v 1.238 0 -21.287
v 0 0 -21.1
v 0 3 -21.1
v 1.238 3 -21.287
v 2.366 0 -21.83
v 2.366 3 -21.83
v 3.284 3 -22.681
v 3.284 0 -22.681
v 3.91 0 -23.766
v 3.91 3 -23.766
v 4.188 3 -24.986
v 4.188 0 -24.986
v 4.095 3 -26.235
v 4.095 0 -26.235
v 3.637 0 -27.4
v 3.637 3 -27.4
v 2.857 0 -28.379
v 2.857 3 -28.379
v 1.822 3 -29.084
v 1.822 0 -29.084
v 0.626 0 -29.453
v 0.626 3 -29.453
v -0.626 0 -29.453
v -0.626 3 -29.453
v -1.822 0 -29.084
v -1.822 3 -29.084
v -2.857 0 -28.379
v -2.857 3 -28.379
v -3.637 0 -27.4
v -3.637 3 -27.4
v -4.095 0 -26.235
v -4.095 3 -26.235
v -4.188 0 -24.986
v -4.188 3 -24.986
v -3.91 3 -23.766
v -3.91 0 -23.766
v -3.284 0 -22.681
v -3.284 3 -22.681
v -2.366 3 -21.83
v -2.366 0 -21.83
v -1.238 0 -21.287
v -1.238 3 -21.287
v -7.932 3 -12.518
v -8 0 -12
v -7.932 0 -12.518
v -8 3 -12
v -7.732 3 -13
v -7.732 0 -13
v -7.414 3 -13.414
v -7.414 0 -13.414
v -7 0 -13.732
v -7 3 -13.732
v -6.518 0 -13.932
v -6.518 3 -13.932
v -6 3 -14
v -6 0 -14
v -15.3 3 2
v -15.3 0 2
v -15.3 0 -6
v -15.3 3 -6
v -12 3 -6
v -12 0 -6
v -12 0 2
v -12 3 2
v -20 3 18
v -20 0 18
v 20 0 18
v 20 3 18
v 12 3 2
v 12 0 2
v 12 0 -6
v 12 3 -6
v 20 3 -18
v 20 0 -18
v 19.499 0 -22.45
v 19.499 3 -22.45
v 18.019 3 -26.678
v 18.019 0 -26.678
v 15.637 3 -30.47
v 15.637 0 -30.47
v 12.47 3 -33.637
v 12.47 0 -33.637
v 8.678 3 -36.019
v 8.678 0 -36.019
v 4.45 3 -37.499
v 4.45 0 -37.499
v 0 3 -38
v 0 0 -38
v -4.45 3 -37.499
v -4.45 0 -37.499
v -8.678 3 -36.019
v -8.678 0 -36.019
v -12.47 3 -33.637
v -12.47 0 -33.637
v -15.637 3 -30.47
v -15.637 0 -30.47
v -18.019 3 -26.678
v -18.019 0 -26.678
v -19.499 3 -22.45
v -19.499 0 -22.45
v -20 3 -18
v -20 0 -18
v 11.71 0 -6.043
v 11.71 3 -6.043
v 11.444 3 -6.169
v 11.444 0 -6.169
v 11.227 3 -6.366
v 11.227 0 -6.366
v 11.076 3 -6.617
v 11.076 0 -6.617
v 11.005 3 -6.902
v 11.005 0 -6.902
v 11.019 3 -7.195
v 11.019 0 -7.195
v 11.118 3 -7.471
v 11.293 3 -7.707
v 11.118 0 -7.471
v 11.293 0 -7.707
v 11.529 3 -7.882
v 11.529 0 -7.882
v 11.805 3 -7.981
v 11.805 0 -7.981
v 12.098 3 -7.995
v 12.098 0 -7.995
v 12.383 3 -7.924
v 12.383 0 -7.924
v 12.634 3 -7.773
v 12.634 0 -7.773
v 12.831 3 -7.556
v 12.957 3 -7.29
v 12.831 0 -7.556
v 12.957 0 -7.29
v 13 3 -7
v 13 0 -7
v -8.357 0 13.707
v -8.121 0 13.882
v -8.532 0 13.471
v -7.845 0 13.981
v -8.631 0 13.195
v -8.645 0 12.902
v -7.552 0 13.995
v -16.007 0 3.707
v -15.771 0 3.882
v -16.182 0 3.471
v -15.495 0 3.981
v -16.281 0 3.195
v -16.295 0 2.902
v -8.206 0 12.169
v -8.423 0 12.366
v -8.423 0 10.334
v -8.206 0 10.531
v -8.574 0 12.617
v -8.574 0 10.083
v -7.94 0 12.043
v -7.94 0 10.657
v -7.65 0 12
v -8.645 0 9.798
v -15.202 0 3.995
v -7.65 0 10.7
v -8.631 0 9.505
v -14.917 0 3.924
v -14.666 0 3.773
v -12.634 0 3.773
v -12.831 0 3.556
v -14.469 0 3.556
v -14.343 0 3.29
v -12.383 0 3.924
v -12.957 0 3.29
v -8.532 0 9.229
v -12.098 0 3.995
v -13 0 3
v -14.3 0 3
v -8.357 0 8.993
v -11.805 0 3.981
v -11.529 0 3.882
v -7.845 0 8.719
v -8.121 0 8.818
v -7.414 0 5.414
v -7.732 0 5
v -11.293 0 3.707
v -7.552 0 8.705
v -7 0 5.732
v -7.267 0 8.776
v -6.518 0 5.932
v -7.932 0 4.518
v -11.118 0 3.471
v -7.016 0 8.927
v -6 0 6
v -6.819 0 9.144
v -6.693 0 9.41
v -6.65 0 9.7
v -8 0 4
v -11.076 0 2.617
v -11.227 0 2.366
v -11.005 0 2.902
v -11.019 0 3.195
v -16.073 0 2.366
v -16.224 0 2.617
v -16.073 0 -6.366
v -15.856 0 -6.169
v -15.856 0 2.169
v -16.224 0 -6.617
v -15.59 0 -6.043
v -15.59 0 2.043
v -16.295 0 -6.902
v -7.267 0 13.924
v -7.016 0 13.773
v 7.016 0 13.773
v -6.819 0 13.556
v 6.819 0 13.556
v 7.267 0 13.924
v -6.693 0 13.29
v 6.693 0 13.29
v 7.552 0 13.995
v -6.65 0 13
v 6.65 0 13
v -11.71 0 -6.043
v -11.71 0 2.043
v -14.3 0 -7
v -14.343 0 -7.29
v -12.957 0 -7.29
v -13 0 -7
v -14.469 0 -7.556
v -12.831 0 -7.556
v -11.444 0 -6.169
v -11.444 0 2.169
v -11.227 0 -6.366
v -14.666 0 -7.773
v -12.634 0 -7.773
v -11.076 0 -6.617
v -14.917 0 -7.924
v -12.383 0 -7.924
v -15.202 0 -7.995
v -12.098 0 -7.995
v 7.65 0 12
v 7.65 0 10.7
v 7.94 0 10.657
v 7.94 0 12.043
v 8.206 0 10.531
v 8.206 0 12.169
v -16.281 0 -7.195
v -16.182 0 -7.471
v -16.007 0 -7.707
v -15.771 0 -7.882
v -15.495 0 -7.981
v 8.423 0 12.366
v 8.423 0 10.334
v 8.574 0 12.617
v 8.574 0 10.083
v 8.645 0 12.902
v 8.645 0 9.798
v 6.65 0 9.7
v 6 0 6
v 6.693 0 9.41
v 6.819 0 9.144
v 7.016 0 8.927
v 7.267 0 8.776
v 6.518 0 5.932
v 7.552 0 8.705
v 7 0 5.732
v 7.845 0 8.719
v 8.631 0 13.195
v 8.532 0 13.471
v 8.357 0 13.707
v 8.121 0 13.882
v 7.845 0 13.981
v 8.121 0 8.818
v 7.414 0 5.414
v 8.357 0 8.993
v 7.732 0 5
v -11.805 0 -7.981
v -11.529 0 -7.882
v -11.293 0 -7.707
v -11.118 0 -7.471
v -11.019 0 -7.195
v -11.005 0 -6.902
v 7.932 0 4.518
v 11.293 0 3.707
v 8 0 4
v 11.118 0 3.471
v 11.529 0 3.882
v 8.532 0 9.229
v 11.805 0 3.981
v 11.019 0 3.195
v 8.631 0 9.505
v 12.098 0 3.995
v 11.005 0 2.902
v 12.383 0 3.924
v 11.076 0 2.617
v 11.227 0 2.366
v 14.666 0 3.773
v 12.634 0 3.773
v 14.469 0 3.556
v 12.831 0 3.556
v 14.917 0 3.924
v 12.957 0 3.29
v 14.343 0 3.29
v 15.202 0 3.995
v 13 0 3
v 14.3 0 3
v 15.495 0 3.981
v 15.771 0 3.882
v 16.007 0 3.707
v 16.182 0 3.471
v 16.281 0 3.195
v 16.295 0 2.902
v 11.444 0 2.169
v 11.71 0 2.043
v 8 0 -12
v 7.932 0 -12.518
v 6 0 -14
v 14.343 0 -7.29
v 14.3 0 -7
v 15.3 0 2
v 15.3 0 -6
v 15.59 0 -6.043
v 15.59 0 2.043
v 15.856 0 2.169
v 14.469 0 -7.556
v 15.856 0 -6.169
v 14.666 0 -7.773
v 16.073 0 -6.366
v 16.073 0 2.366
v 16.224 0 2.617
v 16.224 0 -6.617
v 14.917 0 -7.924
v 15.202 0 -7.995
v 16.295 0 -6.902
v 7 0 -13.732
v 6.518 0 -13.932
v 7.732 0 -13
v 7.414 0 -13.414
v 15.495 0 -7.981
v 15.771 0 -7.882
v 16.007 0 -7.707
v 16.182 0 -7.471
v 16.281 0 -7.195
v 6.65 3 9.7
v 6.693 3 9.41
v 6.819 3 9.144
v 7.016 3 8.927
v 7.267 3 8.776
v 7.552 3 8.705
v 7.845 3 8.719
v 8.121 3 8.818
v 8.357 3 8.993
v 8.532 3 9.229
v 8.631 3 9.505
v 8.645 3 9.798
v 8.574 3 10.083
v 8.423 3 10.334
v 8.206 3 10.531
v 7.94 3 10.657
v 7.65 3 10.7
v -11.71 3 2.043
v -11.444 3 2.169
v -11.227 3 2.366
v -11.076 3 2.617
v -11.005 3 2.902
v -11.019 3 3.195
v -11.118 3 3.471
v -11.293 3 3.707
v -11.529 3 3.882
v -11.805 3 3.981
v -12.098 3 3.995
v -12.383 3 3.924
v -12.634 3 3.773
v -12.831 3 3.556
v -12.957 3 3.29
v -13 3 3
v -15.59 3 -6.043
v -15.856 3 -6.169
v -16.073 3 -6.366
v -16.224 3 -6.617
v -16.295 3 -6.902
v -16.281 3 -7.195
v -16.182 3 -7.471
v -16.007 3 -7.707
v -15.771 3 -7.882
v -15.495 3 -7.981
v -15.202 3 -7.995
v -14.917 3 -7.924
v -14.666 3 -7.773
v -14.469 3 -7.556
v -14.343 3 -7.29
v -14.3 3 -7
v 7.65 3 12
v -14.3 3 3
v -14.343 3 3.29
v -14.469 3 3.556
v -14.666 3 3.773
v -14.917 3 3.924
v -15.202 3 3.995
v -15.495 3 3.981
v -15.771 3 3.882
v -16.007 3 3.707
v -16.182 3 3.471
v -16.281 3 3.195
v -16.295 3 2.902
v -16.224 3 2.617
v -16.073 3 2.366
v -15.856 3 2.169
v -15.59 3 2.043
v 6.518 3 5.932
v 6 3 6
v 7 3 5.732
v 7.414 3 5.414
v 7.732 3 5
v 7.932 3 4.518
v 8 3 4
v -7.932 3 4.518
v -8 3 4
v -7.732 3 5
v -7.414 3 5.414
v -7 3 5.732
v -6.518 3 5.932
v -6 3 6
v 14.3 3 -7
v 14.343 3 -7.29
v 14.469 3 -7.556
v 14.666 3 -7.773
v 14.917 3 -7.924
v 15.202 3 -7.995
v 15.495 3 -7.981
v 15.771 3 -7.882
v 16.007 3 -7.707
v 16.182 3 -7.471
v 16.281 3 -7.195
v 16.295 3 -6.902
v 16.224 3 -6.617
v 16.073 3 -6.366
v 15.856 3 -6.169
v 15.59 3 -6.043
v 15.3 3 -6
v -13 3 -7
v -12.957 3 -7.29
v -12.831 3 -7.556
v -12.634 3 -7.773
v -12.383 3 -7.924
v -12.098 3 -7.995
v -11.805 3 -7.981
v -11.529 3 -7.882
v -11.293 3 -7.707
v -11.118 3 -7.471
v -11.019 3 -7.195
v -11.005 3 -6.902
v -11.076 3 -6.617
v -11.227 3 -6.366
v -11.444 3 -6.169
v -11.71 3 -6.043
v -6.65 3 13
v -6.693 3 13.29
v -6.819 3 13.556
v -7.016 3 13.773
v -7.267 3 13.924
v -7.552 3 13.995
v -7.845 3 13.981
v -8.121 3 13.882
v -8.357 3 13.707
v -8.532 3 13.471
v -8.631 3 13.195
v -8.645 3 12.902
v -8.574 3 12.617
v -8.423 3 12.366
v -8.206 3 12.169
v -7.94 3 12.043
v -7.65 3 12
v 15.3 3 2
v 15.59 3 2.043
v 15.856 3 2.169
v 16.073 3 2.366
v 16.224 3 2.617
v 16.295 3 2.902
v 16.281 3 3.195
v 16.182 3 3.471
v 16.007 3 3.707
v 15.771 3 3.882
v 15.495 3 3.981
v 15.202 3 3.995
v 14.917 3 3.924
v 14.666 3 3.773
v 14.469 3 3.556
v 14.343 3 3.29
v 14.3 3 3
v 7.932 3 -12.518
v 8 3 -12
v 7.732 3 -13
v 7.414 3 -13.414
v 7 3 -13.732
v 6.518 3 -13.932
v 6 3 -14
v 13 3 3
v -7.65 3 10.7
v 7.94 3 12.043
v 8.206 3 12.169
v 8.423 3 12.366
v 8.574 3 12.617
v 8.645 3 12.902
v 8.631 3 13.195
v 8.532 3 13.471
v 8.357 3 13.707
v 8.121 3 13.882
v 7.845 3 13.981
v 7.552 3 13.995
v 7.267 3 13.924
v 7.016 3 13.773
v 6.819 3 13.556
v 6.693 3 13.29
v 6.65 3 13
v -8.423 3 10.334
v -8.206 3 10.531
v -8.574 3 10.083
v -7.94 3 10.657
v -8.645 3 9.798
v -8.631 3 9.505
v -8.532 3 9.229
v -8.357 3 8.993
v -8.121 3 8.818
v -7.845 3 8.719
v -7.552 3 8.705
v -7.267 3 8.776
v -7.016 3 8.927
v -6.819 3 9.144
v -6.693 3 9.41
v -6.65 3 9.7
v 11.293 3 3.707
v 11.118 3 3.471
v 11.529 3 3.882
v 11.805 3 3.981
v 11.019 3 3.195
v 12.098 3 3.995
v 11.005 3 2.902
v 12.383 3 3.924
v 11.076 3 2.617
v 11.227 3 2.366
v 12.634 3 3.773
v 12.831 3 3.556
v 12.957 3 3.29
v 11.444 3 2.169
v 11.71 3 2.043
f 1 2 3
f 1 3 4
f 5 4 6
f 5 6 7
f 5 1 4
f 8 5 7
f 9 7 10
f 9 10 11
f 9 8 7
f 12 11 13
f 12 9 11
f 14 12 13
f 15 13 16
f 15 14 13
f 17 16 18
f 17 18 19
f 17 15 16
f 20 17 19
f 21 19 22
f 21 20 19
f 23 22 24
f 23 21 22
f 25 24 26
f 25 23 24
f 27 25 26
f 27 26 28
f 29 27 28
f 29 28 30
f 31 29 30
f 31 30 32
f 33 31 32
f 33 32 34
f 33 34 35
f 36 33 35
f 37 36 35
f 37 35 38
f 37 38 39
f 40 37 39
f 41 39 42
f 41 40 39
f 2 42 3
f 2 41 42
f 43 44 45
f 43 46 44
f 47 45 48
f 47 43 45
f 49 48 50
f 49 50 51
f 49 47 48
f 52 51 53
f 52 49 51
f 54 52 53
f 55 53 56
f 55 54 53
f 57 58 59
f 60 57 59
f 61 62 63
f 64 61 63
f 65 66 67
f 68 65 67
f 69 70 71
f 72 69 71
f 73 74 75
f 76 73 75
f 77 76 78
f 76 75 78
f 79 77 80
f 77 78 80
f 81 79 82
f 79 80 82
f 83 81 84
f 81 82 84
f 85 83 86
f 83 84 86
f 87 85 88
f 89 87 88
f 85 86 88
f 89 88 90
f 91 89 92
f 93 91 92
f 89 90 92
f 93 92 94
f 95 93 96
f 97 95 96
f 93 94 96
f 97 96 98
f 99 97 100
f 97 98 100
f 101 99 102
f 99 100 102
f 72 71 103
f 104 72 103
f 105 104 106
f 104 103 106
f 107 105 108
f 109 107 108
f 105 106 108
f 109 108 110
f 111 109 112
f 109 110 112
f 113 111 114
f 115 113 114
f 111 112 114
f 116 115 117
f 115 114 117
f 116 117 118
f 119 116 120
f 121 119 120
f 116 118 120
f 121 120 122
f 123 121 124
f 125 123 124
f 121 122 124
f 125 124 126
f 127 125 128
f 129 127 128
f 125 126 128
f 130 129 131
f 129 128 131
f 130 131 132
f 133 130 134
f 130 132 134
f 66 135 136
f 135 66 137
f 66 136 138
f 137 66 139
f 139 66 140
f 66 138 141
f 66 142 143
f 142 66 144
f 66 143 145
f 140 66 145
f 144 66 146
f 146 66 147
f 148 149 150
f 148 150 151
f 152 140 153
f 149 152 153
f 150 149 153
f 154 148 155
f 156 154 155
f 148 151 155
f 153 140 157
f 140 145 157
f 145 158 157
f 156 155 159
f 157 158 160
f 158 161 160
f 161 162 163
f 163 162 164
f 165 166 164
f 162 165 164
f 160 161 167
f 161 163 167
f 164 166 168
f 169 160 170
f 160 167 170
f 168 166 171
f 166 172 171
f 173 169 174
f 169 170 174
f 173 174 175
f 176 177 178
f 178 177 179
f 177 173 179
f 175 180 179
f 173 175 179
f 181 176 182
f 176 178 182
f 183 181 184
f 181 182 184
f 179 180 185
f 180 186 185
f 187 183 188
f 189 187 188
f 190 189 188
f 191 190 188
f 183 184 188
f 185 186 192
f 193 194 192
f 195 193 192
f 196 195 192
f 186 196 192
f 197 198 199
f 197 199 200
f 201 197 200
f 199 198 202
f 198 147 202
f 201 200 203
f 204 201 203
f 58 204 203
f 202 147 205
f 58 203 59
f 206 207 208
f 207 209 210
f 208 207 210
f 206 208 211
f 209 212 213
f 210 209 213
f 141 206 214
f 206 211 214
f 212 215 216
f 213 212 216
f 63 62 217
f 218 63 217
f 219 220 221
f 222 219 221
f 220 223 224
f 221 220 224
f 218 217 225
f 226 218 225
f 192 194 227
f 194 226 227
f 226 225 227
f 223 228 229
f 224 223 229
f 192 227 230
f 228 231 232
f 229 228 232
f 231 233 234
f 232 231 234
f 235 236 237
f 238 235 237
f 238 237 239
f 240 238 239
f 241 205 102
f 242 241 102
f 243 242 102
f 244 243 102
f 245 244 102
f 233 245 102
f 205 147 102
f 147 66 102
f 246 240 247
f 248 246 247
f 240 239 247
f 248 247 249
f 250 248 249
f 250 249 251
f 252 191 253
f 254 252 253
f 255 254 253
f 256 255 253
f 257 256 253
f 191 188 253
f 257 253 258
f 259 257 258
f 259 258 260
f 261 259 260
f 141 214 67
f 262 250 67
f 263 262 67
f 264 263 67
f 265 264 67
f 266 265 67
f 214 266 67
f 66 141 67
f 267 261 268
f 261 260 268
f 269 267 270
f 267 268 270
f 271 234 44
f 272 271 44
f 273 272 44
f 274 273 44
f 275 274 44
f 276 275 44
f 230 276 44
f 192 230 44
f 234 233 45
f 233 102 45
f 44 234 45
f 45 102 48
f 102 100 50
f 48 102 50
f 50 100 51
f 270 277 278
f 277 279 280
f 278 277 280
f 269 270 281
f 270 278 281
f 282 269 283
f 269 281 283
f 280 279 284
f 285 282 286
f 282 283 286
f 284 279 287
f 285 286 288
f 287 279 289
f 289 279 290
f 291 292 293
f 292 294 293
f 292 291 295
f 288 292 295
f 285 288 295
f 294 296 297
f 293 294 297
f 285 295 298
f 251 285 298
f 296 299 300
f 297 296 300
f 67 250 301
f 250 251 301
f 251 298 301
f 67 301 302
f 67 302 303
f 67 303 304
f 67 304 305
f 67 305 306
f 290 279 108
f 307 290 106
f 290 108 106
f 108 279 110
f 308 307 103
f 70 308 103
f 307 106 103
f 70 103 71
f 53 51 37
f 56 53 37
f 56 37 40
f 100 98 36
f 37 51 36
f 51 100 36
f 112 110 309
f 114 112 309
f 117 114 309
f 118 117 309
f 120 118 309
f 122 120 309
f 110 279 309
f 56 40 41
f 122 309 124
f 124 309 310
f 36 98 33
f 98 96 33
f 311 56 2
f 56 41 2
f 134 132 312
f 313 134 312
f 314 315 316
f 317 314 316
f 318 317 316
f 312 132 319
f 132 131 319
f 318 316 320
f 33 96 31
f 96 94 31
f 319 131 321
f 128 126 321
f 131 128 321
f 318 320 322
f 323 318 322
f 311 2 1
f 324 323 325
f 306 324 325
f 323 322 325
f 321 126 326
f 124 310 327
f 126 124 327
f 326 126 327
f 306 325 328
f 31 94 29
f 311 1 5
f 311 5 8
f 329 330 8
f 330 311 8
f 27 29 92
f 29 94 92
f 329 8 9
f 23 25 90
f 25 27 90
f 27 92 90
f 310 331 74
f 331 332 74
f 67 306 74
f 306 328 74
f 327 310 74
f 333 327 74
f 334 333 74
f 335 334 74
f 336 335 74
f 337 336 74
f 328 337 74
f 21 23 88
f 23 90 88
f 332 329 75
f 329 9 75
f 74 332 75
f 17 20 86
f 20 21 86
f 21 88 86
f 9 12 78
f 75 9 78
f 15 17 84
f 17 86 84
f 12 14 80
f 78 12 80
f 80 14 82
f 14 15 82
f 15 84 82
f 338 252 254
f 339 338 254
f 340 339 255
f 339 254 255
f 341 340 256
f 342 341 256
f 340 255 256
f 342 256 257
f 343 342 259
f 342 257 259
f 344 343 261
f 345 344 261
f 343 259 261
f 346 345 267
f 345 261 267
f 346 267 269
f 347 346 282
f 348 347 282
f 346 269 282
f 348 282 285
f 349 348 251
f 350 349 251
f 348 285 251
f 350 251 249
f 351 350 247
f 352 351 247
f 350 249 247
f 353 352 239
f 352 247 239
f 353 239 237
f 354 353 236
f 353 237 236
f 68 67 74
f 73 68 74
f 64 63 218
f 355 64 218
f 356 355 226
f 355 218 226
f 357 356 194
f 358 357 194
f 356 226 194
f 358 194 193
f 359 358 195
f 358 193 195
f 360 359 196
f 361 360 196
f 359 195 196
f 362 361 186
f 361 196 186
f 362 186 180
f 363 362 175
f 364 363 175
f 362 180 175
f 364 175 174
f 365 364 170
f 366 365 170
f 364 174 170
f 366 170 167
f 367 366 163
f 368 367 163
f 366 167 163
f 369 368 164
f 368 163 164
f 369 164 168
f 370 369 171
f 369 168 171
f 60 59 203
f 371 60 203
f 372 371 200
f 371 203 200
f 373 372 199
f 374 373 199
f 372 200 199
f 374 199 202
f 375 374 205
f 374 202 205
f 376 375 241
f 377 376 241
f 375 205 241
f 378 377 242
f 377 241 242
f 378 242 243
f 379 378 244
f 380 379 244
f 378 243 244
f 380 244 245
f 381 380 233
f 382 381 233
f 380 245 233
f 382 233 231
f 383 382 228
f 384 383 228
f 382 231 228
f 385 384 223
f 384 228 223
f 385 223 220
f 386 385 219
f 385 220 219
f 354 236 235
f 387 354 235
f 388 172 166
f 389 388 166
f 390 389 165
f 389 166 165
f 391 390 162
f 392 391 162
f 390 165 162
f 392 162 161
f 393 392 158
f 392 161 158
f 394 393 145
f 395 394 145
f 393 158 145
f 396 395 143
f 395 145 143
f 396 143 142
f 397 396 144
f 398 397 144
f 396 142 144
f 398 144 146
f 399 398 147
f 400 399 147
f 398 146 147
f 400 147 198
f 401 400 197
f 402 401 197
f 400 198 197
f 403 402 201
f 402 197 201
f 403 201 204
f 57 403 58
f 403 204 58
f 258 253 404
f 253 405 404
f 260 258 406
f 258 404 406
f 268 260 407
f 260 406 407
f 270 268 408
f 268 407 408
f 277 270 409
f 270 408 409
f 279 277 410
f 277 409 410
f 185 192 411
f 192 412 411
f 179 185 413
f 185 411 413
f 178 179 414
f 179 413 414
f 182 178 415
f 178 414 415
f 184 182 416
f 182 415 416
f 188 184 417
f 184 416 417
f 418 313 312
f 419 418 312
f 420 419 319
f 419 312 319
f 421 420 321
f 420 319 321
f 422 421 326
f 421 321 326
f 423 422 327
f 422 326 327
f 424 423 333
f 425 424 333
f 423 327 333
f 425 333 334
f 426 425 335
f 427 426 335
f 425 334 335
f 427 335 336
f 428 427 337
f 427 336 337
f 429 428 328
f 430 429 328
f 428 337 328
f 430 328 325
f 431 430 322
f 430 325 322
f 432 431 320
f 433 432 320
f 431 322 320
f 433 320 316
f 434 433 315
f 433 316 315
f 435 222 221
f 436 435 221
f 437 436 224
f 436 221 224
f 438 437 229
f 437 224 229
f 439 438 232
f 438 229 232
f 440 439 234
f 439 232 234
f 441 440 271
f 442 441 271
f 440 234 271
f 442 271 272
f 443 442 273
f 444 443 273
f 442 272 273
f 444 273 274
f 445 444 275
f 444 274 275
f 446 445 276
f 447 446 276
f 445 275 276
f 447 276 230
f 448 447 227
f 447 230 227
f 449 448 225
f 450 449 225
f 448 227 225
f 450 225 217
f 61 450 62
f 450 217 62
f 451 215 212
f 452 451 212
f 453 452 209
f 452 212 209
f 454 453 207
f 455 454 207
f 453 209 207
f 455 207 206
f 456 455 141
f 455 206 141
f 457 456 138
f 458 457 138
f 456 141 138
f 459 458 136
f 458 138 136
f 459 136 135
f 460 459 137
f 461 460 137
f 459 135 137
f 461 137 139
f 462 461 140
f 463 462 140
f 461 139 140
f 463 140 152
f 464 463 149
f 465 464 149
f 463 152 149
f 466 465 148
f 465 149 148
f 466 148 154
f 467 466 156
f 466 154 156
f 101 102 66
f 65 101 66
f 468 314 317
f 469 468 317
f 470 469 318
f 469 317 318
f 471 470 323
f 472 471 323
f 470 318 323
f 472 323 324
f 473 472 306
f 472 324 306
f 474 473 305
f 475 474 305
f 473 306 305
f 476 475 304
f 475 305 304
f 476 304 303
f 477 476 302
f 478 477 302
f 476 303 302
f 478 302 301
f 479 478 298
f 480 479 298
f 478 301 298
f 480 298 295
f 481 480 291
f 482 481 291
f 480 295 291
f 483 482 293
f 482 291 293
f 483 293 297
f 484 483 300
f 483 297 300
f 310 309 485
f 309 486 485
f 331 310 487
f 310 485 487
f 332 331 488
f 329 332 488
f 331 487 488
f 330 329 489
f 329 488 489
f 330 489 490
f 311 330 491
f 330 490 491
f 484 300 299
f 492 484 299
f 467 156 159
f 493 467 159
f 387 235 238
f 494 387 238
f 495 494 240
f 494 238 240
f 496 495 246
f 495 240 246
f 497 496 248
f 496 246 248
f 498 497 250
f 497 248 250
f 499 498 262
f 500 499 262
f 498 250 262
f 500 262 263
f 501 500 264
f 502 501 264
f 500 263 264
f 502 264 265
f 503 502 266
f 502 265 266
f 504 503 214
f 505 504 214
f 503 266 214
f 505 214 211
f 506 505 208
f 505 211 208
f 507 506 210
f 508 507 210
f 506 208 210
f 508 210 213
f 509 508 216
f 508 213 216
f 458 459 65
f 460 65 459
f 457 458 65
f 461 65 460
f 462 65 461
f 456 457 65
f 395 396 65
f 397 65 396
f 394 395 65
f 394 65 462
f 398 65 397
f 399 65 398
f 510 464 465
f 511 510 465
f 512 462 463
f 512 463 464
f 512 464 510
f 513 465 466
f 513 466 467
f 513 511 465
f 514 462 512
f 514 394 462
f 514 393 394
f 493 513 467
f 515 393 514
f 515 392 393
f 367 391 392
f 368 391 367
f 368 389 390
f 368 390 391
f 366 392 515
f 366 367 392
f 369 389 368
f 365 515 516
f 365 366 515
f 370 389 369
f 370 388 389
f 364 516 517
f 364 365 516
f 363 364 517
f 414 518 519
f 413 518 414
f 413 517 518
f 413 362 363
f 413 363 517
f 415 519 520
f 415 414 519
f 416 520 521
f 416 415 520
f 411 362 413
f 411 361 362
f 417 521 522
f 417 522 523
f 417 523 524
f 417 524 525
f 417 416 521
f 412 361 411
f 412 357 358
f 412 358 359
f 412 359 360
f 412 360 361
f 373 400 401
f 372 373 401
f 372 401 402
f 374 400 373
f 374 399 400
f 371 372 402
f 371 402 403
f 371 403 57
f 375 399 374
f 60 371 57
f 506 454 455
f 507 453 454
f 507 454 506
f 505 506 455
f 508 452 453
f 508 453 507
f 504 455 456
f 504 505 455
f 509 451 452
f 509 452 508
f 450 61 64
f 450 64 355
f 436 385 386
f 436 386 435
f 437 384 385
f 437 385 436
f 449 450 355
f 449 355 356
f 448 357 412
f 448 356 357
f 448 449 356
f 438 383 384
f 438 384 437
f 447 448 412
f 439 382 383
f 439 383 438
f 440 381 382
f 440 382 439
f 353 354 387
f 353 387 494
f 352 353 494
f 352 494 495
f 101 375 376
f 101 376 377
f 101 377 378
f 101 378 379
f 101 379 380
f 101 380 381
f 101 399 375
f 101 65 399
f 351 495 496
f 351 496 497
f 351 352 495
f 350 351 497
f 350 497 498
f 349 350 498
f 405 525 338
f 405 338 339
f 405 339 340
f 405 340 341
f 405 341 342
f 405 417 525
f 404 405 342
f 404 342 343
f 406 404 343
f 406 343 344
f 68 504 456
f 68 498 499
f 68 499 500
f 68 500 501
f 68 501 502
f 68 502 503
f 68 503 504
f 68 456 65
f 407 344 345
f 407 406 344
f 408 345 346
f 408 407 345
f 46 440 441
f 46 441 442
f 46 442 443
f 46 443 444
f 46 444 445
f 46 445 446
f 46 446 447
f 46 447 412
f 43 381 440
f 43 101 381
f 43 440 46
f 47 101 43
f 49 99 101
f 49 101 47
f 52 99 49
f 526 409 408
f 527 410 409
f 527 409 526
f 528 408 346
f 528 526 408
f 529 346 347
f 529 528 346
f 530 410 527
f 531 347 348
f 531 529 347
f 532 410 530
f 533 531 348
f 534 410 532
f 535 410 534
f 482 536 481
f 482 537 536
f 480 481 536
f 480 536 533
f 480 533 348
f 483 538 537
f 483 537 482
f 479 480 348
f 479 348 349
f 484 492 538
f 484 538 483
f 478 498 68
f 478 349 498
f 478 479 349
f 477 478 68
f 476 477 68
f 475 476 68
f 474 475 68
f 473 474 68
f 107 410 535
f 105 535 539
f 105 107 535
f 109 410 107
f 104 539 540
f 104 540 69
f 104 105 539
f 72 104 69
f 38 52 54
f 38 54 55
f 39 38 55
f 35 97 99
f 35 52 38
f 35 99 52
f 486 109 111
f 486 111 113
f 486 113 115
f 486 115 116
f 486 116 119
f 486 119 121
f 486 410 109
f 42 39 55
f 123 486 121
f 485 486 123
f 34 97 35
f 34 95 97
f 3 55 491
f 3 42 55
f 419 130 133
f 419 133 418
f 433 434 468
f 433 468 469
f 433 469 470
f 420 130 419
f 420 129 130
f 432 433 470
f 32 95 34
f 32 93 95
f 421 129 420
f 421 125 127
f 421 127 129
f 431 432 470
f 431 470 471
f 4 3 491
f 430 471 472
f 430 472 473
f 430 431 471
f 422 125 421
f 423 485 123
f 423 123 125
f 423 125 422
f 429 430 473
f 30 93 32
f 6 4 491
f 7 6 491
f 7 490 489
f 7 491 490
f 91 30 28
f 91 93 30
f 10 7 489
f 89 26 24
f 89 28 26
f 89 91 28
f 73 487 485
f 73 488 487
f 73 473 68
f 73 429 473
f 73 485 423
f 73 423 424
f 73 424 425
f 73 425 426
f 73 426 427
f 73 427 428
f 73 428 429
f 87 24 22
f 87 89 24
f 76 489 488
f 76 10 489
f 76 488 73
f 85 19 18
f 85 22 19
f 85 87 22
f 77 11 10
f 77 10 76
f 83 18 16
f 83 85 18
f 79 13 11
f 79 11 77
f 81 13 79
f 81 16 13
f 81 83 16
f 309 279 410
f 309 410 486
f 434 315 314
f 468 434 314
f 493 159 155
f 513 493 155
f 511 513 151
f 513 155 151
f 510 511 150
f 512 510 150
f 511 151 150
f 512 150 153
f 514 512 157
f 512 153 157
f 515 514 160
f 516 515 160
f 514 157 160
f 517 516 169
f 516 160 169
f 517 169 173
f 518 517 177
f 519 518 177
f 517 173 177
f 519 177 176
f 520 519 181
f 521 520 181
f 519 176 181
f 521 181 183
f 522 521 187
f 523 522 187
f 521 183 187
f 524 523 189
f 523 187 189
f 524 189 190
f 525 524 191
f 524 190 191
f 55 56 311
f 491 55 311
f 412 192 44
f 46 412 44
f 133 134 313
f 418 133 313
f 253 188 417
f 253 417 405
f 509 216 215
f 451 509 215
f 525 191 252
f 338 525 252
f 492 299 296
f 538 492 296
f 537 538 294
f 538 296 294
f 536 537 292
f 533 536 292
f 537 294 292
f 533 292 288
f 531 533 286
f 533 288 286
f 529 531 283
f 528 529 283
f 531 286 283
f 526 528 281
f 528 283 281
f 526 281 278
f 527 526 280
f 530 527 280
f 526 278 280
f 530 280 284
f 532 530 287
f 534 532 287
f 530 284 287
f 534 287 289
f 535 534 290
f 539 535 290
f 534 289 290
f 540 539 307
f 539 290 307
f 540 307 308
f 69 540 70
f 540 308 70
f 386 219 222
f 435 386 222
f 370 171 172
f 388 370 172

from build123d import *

# Parameters (mm, degrees)
SKETCH_1_R               = 4.2
EXTRUDE_1_DEPTH          = 3
CUT_EXTRUDE_1_DEPTH      = 44.0464865
CUT_EXTRUDE_1_DEPTH_BACK = 44.0464865
SKETCH_2_W               = 16
SKETCH_2_H               = 20
FILLET_1_R               = 2


with BuildPart() as part:
    # 草图1 → 凸台-拉伸1 (new body)
    with BuildSketch(Plane(origin=(0, 0, 0), x_dir=(1, 0, 0), z_dir=(0, 1, 0))):
        with BuildLine():
            ThreePointArc((20, 18), (0, 38), (-20, 18))
            Line((-20, 18), (-20, -18))
            Line((-20, -18), (20, -18))
            Line((20, -18), (20, 18))
        make_face()
        with Locations((0, 25.3)):
            Circle(SKETCH_1_R, mode=Mode.SUBTRACT)
        with BuildLine():
            Line((15.3, 6), (15.3, -2))
            ThreePointArc((15.3, -2), (16.007106781, -3.707106781), (14.3, -3))
            Line((14.3, -3), (13, -3))
            ThreePointArc((13, -3), (11.292893219, -3.707106781), (12, -2))
            Line((12, -2), (12, 6))
            ThreePointArc((12, 6), (11.292893219, 7.707106781), (13, 7))
            Line((13, 7), (14.3, 7))
            ThreePointArc((14.3, 7), (16.007106781, 7.707106781), (15.3, 6))
        make_face(mode=Mode.SUBTRACT)
        with BuildLine():
            Line((-12, 6), (-12, -2))
            ThreePointArc((-12, -2), (-11.292893219, -3.707106781), (-13, -3))
            Line((-13, -3), (-14.3, -3))
            ThreePointArc((-14.3, -3), (-16.007106781, -3.707106781), (-15.3, -2))
            Line((-15.3, -2), (-15.3, 6))
            ThreePointArc((-15.3, 6), (-16.007106781, 7.707106781), (-14.3, 7))
            Line((-14.3, 7), (-13, 7))
            ThreePointArc((-13, 7), (-11.292893219, 7.707106781), (-12, 6))
        make_face(mode=Mode.SUBTRACT)
        with BuildLine():
            Line((-6.65, -9.7), (6.65, -9.7))
            ThreePointArc((6.65, -9.7), (8.357106781, -8.992893219), (7.65, -10.7))
            Line((7.65, -10.7), (7.65, -12))
            ThreePointArc((7.65, -12), (8.357106781, -13.707106781), (6.65, -13))
            Line((6.65, -13), (-6.65, -13))
            ThreePointArc((-6.65, -13), (-8.357106781, -13.707106781), (-7.65, -12))
            Line((-7.65, -12), (-7.65, -10.7))
            ThreePointArc((-7.65, -10.7), (-8.357106781, -8.992893219), (-6.65, -9.7))
        make_face(mode=Mode.SUBTRACT)
    extrude(amount=EXTRUDE_1_DEPTH)

    # 草图2 → 切除-拉伸1 (cut, two sides: drawn at the far end of the back side and taken through both)
    with BuildSketch(Plane(origin=(0, 3, 0), x_dir=(1, 0, 0), z_dir=(0, 1, 0)).offset(-CUT_EXTRUDE_1_DEPTH_BACK)):
        with Locations((0, 4)):
            Rectangle(SKETCH_2_W, SKETCH_2_H)
    extrude(amount=CUT_EXTRUDE_1_DEPTH + CUT_EXTRUDE_1_DEPTH_BACK, mode=Mode.SUBTRACT)

    # 圆角1
    fillet_1_edges = [part.edges().sort_by_distance(p)[0] for p in [
        (-8, 1.5, 6),
        (8, 1.5, 6),
        (8, 1.5, -14),
        (-8, 1.5, -14),
    ]]
    fillet(fillet_1_edges, radius=FILLET_1_R)


solid = part.part
